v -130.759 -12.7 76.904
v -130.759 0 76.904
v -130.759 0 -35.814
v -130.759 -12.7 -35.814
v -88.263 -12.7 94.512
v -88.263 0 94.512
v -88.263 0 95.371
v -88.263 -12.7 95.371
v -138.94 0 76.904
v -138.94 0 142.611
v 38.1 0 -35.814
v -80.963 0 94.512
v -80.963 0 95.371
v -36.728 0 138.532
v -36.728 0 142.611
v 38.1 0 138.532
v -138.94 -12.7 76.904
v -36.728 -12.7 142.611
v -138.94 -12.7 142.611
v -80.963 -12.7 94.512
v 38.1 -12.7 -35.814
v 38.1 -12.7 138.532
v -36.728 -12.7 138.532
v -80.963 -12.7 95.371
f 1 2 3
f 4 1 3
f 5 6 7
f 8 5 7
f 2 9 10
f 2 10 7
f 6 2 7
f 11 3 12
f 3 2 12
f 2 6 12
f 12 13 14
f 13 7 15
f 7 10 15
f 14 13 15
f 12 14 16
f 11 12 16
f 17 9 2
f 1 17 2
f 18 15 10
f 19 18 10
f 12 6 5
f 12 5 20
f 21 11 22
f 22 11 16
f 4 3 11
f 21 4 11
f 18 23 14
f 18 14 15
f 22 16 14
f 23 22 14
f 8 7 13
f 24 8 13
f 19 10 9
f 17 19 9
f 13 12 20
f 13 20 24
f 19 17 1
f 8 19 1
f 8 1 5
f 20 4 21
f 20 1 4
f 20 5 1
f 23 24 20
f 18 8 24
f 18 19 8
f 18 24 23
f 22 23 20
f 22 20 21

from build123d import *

# Parameters (mm, degrees)
F0_W     = 94.0314047039
F0_H     = 61.6279765964
F0_W_2   = 7.300876081
F0_H_2   = 0.858925283
F1_DEPTH = 25.4
F2_DEPTH = 12.7


with BuildPart() as f1:
    # F0 (on Front) → F1 (new body)
    with BuildSketch(Plane.XZ):
        Polygon((-130.7592019439, -35.8140021563), (38.1000041962, -35.8140021563), (38.1000041962, 138.5316029191), (-36.72779724, 138.5316029191), (-36.72779724, 76.9036263227), (-130.7592019439, 76.9036263227), align=None)
        Polygon((-138.9400362968, 76.9036263227), (-130.7592019439, 76.9036263227), (-130.7592019439, 138.5316029191), (-36.72779724, 138.5316029191), (-36.72779724, 142.6114886999), (-138.9400362968, 142.6114886999), align=None)
        with Locations((-83.7434995919, 107.7176146209)):
            Rectangle(F0_W, F0_H)
        with Locations((-84.6129395068, 94.9410833418)):
            Rectangle(F0_W_2, F0_H_2, mode=Mode.SUBTRACT)
    extrude(amount=F1_DEPTH)

    # F2 (cut, symmetric): a face of the model
    f2_faces = [f1.faces().sort_by_distance(p)[0] for p in [
        (-48.3621229952, -25.4, 53.5114771405),
    ]]
    extrude(f2_faces, amount=F2_DEPTH, both=True, mode=Mode.SUBTRACT)


solid = f1.part
